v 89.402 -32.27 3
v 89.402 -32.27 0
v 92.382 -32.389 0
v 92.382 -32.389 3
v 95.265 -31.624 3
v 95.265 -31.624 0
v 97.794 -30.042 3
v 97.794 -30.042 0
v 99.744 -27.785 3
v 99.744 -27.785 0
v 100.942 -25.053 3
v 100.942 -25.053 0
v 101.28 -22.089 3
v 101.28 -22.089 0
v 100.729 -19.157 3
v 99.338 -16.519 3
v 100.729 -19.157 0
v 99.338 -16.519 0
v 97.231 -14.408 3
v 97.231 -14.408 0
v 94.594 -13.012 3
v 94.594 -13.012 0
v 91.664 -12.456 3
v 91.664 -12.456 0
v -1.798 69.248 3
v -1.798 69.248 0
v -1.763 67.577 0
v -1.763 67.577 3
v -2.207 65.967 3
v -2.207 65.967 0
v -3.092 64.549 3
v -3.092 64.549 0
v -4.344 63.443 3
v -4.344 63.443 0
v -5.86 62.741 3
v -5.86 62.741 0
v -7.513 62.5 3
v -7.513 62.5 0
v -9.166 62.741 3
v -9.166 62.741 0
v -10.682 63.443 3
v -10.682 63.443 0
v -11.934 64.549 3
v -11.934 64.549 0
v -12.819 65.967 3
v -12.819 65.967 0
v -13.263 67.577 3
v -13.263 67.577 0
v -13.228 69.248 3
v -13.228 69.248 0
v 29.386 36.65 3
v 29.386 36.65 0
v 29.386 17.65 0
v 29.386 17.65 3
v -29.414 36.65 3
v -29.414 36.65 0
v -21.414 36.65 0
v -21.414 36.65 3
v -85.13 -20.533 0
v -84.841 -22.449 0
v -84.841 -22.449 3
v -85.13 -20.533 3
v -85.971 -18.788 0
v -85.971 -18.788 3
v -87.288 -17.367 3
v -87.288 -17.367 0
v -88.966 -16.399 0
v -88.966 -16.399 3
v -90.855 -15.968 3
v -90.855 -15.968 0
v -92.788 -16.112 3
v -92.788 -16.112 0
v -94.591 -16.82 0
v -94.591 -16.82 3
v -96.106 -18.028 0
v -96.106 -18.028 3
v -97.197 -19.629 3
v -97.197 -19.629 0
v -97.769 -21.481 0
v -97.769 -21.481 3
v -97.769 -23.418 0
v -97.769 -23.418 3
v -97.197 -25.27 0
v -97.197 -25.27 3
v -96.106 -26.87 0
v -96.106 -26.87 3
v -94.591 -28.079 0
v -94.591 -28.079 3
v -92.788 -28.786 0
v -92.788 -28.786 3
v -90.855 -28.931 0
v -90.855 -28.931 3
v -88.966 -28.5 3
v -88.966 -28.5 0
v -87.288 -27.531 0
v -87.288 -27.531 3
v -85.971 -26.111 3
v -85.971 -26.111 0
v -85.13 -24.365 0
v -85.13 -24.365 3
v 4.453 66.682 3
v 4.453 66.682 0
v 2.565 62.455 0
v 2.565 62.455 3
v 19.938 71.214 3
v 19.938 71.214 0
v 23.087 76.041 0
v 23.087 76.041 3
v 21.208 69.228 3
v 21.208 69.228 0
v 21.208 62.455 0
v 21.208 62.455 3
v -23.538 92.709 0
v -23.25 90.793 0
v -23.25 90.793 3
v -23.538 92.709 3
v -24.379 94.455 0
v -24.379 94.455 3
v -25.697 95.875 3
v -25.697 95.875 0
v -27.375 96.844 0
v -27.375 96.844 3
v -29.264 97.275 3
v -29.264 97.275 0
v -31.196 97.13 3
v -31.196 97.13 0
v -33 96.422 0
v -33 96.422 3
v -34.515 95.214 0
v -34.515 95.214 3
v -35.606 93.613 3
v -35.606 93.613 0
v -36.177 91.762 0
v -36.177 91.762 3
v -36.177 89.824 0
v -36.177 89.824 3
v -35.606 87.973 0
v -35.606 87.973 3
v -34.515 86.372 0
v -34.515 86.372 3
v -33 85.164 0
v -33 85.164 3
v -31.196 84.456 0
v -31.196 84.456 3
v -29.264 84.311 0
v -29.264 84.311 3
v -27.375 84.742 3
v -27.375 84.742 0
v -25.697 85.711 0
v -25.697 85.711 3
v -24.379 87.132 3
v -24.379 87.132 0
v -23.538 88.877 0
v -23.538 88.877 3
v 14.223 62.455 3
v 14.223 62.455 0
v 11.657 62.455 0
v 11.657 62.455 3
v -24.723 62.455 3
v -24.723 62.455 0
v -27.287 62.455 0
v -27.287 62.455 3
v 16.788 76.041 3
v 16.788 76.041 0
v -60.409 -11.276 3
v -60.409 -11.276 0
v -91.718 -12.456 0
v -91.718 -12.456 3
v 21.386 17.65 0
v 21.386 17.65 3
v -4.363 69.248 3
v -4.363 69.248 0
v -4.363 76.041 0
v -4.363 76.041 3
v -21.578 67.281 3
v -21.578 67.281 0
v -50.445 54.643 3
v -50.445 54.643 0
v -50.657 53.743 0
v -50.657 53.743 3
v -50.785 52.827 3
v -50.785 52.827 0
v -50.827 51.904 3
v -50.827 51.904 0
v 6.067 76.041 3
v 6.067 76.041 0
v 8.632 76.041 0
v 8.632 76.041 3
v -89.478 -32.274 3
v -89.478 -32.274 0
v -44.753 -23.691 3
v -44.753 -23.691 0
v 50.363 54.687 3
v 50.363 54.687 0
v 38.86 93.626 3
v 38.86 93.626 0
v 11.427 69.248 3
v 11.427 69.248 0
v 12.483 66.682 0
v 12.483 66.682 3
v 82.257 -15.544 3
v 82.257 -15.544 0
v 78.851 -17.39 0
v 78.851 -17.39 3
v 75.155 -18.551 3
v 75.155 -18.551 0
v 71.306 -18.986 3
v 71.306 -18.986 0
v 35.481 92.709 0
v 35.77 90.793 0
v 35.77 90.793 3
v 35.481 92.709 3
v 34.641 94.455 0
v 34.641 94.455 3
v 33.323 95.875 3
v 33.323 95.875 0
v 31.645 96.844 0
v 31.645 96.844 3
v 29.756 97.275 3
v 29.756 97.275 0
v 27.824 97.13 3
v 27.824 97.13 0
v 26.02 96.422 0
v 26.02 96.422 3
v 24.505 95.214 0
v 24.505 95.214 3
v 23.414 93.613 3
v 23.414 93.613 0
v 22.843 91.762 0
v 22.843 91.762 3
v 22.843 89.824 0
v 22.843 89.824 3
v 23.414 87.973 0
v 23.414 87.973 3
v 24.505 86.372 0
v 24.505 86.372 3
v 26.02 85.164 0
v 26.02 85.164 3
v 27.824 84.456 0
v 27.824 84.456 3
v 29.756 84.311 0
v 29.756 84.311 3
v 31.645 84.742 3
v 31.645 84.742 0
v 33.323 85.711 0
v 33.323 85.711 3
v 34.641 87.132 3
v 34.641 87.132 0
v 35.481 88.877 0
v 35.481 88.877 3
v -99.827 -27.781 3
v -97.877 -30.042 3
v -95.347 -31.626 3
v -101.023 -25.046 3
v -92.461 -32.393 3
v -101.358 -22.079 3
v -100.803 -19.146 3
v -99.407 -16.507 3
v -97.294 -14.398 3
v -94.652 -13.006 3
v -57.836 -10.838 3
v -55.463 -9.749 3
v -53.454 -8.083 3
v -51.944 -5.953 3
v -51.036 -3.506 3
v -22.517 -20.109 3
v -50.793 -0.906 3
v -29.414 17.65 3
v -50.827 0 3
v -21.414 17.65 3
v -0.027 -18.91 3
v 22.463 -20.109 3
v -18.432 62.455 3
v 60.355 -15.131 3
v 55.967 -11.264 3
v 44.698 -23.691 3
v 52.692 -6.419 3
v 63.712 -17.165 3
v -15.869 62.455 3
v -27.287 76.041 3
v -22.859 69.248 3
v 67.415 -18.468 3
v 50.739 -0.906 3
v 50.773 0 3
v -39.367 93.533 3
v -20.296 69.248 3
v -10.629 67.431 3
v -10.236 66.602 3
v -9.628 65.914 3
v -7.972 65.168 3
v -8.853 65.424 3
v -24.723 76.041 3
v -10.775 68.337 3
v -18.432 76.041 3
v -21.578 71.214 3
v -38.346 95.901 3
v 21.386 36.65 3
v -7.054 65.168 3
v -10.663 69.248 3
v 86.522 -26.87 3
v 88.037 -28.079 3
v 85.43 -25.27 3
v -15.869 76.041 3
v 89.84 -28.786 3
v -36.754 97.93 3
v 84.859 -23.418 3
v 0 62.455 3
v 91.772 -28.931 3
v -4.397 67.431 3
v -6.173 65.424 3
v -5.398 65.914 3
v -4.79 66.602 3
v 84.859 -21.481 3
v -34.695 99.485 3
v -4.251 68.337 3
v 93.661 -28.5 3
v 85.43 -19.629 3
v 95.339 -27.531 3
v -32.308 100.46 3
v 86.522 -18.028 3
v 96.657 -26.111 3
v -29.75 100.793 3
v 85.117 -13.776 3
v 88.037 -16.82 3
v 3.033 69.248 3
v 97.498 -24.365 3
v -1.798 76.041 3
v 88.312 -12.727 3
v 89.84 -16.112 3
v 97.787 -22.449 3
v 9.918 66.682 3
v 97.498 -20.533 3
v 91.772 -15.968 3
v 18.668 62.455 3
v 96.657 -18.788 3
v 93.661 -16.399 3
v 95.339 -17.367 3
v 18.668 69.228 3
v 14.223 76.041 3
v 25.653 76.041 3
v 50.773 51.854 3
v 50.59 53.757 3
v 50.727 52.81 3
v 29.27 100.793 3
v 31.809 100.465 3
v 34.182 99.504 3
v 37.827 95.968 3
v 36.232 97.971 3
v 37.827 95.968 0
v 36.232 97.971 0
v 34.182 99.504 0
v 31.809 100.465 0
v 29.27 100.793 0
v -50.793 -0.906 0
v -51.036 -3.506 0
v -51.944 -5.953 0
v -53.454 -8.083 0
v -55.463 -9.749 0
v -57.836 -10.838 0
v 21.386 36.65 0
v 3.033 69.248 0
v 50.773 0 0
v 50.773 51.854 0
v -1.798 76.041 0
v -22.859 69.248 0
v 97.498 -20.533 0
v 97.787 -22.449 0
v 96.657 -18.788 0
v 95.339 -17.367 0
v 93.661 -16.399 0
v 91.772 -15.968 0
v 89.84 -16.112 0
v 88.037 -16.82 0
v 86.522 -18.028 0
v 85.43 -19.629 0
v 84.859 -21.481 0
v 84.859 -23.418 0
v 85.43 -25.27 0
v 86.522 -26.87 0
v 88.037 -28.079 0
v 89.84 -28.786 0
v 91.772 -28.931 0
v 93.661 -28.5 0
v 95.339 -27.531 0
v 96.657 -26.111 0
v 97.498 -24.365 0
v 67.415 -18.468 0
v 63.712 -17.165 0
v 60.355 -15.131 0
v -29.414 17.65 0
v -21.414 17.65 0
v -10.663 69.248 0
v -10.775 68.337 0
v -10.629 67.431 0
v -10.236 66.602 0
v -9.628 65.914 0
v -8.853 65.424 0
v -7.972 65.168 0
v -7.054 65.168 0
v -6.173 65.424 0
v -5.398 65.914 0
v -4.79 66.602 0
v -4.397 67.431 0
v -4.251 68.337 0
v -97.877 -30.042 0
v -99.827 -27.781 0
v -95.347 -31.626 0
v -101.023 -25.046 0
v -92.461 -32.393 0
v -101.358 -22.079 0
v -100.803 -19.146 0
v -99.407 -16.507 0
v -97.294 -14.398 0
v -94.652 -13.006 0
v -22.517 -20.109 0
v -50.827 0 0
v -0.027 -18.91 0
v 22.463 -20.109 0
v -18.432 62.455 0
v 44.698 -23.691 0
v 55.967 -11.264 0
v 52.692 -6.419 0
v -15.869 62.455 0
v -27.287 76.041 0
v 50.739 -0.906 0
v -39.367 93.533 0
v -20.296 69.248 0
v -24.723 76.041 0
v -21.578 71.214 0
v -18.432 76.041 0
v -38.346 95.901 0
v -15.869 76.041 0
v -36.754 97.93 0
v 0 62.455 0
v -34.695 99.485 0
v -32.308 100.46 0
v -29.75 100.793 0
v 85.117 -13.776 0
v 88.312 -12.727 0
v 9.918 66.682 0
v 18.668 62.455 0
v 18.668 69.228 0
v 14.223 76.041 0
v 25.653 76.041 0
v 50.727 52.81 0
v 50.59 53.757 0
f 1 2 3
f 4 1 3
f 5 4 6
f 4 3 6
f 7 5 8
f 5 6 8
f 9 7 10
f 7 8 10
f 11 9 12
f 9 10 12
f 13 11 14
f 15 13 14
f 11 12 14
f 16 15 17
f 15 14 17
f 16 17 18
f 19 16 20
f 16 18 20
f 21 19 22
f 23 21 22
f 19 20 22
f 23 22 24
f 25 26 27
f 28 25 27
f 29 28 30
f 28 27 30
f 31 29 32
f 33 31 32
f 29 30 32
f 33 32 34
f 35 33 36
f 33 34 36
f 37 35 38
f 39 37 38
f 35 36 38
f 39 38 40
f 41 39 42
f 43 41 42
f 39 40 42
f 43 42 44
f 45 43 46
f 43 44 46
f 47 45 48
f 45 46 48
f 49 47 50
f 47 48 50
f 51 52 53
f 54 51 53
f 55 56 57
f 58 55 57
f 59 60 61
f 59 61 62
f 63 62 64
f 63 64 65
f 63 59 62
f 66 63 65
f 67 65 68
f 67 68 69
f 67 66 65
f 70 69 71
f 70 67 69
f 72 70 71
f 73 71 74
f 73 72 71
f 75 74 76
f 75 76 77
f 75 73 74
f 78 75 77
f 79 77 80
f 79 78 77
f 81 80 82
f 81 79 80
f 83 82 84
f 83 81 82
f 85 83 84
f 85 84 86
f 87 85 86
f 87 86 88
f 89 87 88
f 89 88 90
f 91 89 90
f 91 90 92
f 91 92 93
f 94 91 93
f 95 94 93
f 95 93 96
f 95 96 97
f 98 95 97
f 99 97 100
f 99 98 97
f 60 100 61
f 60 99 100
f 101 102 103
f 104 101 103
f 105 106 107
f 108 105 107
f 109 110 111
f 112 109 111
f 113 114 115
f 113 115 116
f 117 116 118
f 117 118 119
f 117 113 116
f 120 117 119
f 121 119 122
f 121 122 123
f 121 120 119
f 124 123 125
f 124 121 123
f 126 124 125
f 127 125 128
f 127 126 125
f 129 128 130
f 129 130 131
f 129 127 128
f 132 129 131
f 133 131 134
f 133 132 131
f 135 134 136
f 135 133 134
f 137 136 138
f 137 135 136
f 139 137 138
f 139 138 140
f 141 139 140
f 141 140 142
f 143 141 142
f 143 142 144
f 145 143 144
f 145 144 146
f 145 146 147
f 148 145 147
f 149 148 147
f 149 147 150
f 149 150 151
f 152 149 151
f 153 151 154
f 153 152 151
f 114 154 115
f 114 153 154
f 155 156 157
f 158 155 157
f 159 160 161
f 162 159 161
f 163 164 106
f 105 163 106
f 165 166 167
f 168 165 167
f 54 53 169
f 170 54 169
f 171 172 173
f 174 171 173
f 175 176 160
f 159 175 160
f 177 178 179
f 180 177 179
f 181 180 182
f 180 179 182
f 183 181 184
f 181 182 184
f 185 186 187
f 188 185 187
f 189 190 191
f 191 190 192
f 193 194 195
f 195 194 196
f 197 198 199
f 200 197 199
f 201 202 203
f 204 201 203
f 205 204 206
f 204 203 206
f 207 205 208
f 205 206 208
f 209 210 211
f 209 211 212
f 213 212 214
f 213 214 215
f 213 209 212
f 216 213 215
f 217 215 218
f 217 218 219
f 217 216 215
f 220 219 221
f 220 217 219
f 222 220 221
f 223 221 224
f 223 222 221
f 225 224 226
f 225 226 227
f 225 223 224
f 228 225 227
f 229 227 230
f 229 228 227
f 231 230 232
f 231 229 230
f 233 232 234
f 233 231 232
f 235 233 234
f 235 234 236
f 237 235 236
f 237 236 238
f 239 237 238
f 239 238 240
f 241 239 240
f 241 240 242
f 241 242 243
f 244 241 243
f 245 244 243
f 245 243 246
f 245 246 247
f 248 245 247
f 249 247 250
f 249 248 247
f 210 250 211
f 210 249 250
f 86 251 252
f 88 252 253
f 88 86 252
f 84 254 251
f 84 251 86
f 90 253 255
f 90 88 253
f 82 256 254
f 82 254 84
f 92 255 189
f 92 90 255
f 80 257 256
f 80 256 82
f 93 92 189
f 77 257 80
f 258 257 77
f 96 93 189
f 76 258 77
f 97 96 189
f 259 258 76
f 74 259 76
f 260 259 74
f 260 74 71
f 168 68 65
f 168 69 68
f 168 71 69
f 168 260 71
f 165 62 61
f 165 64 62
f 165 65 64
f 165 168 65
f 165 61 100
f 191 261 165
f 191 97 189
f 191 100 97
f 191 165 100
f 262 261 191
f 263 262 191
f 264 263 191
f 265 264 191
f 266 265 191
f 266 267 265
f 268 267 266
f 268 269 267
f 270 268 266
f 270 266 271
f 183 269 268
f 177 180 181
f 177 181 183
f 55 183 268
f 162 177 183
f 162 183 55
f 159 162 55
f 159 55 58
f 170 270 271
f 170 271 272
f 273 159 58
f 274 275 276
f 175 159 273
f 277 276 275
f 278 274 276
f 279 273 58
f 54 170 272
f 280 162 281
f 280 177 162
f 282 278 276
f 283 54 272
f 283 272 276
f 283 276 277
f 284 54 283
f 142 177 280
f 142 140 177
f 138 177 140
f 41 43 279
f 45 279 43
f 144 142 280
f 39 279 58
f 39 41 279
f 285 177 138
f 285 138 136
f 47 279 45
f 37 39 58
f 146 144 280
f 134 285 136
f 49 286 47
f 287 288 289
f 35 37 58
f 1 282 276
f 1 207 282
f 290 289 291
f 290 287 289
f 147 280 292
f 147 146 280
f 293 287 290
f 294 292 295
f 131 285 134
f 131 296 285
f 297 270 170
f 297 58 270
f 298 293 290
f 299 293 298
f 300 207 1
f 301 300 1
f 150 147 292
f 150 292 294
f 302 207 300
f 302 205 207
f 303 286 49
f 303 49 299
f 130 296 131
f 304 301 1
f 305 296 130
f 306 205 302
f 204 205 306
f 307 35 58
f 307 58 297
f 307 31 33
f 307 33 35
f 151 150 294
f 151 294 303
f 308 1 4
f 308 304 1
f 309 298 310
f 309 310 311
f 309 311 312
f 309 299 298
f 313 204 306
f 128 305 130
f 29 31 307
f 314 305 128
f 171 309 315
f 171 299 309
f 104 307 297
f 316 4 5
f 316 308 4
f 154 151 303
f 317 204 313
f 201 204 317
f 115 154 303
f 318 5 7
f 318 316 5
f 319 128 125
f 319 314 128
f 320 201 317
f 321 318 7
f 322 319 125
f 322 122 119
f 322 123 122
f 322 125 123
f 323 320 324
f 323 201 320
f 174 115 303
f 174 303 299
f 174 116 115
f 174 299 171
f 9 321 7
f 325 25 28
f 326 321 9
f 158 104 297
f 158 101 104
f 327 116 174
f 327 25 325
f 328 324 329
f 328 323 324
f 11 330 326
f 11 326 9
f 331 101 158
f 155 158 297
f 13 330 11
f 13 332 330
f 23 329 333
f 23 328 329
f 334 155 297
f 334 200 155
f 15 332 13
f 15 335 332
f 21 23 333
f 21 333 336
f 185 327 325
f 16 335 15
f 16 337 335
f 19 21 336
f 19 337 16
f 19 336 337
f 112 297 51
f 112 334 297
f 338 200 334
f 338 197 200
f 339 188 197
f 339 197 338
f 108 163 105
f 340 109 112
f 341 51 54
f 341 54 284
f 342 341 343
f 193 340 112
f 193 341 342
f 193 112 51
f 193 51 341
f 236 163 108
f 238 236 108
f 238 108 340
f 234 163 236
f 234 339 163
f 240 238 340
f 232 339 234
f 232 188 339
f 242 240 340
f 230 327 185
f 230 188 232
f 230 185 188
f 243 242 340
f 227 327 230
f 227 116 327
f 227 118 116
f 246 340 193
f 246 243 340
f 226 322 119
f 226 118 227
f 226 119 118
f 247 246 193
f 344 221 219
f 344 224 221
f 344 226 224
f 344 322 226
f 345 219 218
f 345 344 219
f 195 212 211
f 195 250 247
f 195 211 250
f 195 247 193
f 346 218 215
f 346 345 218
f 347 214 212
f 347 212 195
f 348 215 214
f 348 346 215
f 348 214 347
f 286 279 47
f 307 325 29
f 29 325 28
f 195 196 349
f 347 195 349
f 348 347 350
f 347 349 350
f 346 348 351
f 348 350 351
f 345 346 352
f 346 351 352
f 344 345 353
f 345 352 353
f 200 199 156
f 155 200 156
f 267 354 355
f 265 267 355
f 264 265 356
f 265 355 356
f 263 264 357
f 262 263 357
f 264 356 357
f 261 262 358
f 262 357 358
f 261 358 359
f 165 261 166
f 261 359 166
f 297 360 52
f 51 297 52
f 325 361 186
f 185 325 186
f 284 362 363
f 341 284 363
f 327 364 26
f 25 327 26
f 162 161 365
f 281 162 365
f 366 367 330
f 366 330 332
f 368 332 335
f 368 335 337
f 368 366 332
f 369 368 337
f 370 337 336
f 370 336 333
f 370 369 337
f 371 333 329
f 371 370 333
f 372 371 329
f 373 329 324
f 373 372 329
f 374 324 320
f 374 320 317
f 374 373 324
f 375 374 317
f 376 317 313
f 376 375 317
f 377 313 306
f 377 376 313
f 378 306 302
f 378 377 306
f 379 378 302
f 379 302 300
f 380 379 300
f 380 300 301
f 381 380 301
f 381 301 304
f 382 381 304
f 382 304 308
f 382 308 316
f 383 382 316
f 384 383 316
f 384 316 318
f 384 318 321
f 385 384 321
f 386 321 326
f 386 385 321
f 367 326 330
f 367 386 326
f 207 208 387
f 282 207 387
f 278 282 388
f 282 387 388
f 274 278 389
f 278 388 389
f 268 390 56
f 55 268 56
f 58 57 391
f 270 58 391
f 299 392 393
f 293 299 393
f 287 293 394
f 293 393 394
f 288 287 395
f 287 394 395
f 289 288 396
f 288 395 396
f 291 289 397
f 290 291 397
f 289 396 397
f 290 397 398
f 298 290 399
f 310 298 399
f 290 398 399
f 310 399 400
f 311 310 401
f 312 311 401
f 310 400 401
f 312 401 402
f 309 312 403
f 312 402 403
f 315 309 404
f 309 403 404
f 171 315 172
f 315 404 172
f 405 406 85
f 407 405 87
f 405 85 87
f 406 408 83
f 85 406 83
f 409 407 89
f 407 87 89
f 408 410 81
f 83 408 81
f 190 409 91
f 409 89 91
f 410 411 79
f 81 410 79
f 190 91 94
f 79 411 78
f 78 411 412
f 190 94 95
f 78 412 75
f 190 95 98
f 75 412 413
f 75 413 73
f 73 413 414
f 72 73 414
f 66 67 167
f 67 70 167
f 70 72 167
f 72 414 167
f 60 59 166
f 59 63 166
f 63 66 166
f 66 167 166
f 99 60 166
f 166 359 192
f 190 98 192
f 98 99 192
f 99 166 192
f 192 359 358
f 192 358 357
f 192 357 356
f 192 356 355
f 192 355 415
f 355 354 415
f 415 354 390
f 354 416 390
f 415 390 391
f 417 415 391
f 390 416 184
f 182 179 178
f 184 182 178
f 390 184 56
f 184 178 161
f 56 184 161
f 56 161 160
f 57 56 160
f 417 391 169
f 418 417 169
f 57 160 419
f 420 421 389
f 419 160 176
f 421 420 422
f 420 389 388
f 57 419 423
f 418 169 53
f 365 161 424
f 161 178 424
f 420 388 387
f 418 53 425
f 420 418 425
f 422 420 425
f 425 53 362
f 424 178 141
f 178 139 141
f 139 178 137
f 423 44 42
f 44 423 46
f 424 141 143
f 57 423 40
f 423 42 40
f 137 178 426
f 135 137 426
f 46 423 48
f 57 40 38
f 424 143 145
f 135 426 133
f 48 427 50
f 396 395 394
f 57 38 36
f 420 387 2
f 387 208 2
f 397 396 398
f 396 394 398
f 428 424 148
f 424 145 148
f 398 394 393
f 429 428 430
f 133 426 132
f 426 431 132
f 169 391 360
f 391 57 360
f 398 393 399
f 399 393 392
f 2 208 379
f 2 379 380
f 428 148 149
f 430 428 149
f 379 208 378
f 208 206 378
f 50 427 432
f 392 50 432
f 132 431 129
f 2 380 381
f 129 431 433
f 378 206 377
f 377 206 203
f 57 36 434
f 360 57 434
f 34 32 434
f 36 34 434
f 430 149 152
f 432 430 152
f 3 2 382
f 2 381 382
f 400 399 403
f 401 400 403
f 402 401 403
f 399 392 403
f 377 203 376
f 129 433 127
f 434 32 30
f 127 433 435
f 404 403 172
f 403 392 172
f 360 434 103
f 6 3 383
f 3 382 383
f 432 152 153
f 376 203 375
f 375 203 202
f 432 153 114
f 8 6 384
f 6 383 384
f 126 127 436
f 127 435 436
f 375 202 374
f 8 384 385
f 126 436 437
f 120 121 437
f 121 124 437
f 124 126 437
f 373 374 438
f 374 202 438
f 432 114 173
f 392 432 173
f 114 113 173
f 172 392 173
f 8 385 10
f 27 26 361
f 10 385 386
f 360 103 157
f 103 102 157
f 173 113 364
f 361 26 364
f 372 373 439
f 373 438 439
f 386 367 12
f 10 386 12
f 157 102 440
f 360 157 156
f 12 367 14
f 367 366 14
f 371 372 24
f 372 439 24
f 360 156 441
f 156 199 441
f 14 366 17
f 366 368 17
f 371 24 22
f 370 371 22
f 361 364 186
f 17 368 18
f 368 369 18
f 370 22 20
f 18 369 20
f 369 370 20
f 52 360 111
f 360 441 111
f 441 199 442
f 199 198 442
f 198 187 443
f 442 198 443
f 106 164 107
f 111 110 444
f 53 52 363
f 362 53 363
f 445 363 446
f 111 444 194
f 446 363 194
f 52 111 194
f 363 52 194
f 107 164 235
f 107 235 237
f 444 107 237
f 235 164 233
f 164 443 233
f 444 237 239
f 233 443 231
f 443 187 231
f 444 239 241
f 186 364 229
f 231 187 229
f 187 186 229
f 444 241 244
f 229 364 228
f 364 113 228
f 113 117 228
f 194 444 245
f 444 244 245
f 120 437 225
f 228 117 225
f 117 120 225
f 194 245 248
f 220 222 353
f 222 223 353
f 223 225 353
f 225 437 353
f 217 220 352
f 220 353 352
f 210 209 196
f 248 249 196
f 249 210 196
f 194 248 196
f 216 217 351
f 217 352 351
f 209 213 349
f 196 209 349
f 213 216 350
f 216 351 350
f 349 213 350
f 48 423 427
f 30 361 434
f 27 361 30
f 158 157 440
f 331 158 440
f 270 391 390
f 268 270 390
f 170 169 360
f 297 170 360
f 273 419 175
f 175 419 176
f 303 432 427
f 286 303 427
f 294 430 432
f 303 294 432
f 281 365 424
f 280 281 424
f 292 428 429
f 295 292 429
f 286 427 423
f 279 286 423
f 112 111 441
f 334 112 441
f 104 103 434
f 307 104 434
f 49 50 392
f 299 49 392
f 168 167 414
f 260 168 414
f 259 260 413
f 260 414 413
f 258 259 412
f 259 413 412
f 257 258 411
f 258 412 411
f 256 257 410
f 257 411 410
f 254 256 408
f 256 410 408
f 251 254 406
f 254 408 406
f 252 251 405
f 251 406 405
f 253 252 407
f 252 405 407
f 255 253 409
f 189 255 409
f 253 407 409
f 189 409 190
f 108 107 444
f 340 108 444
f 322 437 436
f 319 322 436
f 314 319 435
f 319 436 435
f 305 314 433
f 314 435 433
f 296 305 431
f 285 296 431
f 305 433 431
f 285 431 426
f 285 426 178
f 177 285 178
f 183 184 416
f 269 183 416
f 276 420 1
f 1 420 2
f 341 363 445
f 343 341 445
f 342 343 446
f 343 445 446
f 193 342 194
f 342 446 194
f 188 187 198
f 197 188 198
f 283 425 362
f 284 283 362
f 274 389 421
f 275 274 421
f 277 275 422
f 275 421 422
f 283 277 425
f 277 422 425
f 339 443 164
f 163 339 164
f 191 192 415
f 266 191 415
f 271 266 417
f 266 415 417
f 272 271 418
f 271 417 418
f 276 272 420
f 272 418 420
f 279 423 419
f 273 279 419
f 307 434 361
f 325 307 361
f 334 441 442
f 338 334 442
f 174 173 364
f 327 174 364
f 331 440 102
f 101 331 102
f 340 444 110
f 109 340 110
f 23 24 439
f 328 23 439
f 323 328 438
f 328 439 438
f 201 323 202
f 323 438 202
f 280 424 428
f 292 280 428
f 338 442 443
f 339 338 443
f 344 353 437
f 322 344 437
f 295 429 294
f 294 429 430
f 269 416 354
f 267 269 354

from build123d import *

# Parameters (mm, degrees)
F0_R     = 6.5
F1_DEPTH = 3


with BuildPart() as f1:
    # F0 (on Top) → F1 (new body)
    with BuildSketch(Plane.XY):
        with BuildLine():
            ThreePointArc((-50.4446934155, 54.643037695), (-50.7311517832, 53.2865797574), (-50.8272536099, 51.9035392764))
            Line((-50.8272536099, 51.9035392764), (-50.8272536099, 0))
            Line((-50.8272536099, 0), (-50.793080697, -0.9064006647))
            ThreePointArc((-50.793080697, -0.9064006647), (-53.4535309431, -8.0827958775), (-60.4092310726, -11.2760511869))
            Line((-60.4092310726, -11.2760511869), (-91.7179190296, -12.4564442613))
            ThreePointArc((-91.7179190296, -12.4564442613), (-101.3019147634, -23.5749788423), (-89.4783611915, -32.2743102182))
            Line((-89.4783611915, -32.2743102182), (-44.7528083417, -23.6906495904))
            ThreePointArc((-44.7528083417, -23.6906495904), (-0.027288473, -18.9100440737), (44.6982313957, -23.6906495904))
            Line((44.6982313957, -23.6906495904), (89.4018683635, -32.2701168083))
            ThreePointArc((89.4018683635, -32.2701168083), (101.2221357059, -23.5834967295), (91.6636327073, -12.4564526987))
            ThreePointArc((91.6636327073, -12.4564526987), (86.6833273054, -13.1568395353), (82.2565257549, -15.5437646806))
            ThreePointArc((82.2565257549, -15.5437646806), (77.0307926492, -18.0592618118), (71.3056156264, -18.9857392083))
            ThreePointArc((71.3056156264, -18.9857392083), (65.5296199383, -17.9121006865), (60.3547054978, -15.1308983568))
            ThreePointArc((60.3547054978, -15.1308983568), (54.175499635, -8.9454500235), (50.73856136, -0.9061831743))
            Line((50.73856136, -0.9061831743), (50.7727463901, 0))
            Line((50.7727463901, 0), (50.7727463901, 51.8538707076))
            ThreePointArc((50.7727463901, 51.8538707076), (50.669793885, 53.2851117367), (50.3630562134, 54.6868827959))
            Line((50.3630562134, 54.6868827959), (38.8602722461, 93.6260961278))
            ThreePointArc((38.8602722461, 93.6260961278), (35.256191583, 98.8033936741), (29.2699624228, 100.7930840395))
            Line((29.2699624228, 100.7930840395), (-29.7496853037, 100.7930840395))
            ThreePointArc((-29.7496853037, 100.7930840395), (-35.7748415596, 98.7741549008), (-39.3671251094, 93.5325824581))
            Line((-39.3671251094, 93.5325824581), (-50.4446934155, 54.643037695))
        make_face()
        with Locations((-91.3411689563, -22.4493447103)):
            Circle(F0_R, mode=Mode.SUBTRACT)
        Polygon((-21.4136268049, 36.65), (-21.4136268049, 26.65), (-21.4136268049, 17.65), (-29.4136268049, 17.65), (-29.4136268049, 26.65), (-29.4136268049, 36.65), align=None, mode=Mode.SUBTRACT)
        with Locations((91.2866589082, -22.4493447103)):
            Circle(F0_R, mode=Mode.SUBTRACT)
        Polygon((21.3863731951, 17.65), (21.3863731951, 26.65), (21.3863731951, 36.65), (29.3863731951, 36.65), (29.3863731951, 26.65), (29.3863731951, 17.65), align=None, mode=Mode.SUBTRACT)
        Polygon((-22.8592688218, 69.2477548305), (-27.2865649313, 76.0405882364), (-24.7233938426, 76.0405882364), (-21.5776832774, 71.2141010795), (-18.4319727123, 76.0405882364), (-15.8688016236, 76.0405882364), (-20.2960977331, 69.2477548305), (-15.8688016236, 62.4549214246), (-18.4319727123, 62.4549214246), (-21.5776832774, 67.2814085815), (-24.7233938426, 62.4549214246), (-27.2865649313, 62.4549214246), align=None, mode=Mode.SUBTRACT)
        with BuildLine():
            ThreePointArc((-1.7979582322, 69.2477548305), (-7.5129582322, 62.4999219931), (-13.2279582322, 69.2477548305))
            Line((-13.2279582322, 69.2477548305), (-10.6625582322, 69.2477548305))
            ThreePointArc((-10.6625582322, 69.2477548305), (-7.5129582322, 65.1356067586), (-4.3633582322, 69.2477548305))
            Line((-4.3633582322, 69.2477548305), (-4.3633582322, 76.0405882364))
            Line((-4.3633582322, 76.0405882364), (-1.7979582322, 76.0405882364))
            Line((-1.7979582322, 76.0405882364), (-1.7979582322, 69.2477548305))
        make_face(mode=Mode.SUBTRACT)
        with Locations((-29.7496853037, 90.7930840395)):
            Circle(F0_R, mode=Mode.SUBTRACT)
        Polygon((2.5654, 62.4549214246), (0, 62.4549214246), (3.0334836338, 69.2477548305), (6.0669672675, 76.0405882364), (8.6323672675, 76.0405882364), (11.4274396446, 69.2477548305), (12.4830343056, 66.6823548305), (14.2225120217, 62.4549214246), (11.6571120217, 62.4549214246), (9.9176343056, 66.6823548305), (4.453249927, 66.6823548305), align=None, mode=Mode.SUBTRACT)
        Polygon((18.6675120217, 69.2282911245), (14.2225120217, 76.0405882364), (16.7879120217, 76.0405882364), (19.9375120217, 71.21358914), (23.0871120217, 76.0405882364), (25.6525120217, 76.0405882364), (21.2075120217, 69.2282911245), (21.2075120217, 62.4549214246), (19.9375120217, 62.4549214246), (18.6675120217, 62.4549214246), align=None, mode=Mode.SUBTRACT)
        with Locations((29.2699624228, 90.7930840395)):
            Circle(F0_R, mode=Mode.SUBTRACT)
    extrude(amount=F1_DEPTH)


solid = f1.part
